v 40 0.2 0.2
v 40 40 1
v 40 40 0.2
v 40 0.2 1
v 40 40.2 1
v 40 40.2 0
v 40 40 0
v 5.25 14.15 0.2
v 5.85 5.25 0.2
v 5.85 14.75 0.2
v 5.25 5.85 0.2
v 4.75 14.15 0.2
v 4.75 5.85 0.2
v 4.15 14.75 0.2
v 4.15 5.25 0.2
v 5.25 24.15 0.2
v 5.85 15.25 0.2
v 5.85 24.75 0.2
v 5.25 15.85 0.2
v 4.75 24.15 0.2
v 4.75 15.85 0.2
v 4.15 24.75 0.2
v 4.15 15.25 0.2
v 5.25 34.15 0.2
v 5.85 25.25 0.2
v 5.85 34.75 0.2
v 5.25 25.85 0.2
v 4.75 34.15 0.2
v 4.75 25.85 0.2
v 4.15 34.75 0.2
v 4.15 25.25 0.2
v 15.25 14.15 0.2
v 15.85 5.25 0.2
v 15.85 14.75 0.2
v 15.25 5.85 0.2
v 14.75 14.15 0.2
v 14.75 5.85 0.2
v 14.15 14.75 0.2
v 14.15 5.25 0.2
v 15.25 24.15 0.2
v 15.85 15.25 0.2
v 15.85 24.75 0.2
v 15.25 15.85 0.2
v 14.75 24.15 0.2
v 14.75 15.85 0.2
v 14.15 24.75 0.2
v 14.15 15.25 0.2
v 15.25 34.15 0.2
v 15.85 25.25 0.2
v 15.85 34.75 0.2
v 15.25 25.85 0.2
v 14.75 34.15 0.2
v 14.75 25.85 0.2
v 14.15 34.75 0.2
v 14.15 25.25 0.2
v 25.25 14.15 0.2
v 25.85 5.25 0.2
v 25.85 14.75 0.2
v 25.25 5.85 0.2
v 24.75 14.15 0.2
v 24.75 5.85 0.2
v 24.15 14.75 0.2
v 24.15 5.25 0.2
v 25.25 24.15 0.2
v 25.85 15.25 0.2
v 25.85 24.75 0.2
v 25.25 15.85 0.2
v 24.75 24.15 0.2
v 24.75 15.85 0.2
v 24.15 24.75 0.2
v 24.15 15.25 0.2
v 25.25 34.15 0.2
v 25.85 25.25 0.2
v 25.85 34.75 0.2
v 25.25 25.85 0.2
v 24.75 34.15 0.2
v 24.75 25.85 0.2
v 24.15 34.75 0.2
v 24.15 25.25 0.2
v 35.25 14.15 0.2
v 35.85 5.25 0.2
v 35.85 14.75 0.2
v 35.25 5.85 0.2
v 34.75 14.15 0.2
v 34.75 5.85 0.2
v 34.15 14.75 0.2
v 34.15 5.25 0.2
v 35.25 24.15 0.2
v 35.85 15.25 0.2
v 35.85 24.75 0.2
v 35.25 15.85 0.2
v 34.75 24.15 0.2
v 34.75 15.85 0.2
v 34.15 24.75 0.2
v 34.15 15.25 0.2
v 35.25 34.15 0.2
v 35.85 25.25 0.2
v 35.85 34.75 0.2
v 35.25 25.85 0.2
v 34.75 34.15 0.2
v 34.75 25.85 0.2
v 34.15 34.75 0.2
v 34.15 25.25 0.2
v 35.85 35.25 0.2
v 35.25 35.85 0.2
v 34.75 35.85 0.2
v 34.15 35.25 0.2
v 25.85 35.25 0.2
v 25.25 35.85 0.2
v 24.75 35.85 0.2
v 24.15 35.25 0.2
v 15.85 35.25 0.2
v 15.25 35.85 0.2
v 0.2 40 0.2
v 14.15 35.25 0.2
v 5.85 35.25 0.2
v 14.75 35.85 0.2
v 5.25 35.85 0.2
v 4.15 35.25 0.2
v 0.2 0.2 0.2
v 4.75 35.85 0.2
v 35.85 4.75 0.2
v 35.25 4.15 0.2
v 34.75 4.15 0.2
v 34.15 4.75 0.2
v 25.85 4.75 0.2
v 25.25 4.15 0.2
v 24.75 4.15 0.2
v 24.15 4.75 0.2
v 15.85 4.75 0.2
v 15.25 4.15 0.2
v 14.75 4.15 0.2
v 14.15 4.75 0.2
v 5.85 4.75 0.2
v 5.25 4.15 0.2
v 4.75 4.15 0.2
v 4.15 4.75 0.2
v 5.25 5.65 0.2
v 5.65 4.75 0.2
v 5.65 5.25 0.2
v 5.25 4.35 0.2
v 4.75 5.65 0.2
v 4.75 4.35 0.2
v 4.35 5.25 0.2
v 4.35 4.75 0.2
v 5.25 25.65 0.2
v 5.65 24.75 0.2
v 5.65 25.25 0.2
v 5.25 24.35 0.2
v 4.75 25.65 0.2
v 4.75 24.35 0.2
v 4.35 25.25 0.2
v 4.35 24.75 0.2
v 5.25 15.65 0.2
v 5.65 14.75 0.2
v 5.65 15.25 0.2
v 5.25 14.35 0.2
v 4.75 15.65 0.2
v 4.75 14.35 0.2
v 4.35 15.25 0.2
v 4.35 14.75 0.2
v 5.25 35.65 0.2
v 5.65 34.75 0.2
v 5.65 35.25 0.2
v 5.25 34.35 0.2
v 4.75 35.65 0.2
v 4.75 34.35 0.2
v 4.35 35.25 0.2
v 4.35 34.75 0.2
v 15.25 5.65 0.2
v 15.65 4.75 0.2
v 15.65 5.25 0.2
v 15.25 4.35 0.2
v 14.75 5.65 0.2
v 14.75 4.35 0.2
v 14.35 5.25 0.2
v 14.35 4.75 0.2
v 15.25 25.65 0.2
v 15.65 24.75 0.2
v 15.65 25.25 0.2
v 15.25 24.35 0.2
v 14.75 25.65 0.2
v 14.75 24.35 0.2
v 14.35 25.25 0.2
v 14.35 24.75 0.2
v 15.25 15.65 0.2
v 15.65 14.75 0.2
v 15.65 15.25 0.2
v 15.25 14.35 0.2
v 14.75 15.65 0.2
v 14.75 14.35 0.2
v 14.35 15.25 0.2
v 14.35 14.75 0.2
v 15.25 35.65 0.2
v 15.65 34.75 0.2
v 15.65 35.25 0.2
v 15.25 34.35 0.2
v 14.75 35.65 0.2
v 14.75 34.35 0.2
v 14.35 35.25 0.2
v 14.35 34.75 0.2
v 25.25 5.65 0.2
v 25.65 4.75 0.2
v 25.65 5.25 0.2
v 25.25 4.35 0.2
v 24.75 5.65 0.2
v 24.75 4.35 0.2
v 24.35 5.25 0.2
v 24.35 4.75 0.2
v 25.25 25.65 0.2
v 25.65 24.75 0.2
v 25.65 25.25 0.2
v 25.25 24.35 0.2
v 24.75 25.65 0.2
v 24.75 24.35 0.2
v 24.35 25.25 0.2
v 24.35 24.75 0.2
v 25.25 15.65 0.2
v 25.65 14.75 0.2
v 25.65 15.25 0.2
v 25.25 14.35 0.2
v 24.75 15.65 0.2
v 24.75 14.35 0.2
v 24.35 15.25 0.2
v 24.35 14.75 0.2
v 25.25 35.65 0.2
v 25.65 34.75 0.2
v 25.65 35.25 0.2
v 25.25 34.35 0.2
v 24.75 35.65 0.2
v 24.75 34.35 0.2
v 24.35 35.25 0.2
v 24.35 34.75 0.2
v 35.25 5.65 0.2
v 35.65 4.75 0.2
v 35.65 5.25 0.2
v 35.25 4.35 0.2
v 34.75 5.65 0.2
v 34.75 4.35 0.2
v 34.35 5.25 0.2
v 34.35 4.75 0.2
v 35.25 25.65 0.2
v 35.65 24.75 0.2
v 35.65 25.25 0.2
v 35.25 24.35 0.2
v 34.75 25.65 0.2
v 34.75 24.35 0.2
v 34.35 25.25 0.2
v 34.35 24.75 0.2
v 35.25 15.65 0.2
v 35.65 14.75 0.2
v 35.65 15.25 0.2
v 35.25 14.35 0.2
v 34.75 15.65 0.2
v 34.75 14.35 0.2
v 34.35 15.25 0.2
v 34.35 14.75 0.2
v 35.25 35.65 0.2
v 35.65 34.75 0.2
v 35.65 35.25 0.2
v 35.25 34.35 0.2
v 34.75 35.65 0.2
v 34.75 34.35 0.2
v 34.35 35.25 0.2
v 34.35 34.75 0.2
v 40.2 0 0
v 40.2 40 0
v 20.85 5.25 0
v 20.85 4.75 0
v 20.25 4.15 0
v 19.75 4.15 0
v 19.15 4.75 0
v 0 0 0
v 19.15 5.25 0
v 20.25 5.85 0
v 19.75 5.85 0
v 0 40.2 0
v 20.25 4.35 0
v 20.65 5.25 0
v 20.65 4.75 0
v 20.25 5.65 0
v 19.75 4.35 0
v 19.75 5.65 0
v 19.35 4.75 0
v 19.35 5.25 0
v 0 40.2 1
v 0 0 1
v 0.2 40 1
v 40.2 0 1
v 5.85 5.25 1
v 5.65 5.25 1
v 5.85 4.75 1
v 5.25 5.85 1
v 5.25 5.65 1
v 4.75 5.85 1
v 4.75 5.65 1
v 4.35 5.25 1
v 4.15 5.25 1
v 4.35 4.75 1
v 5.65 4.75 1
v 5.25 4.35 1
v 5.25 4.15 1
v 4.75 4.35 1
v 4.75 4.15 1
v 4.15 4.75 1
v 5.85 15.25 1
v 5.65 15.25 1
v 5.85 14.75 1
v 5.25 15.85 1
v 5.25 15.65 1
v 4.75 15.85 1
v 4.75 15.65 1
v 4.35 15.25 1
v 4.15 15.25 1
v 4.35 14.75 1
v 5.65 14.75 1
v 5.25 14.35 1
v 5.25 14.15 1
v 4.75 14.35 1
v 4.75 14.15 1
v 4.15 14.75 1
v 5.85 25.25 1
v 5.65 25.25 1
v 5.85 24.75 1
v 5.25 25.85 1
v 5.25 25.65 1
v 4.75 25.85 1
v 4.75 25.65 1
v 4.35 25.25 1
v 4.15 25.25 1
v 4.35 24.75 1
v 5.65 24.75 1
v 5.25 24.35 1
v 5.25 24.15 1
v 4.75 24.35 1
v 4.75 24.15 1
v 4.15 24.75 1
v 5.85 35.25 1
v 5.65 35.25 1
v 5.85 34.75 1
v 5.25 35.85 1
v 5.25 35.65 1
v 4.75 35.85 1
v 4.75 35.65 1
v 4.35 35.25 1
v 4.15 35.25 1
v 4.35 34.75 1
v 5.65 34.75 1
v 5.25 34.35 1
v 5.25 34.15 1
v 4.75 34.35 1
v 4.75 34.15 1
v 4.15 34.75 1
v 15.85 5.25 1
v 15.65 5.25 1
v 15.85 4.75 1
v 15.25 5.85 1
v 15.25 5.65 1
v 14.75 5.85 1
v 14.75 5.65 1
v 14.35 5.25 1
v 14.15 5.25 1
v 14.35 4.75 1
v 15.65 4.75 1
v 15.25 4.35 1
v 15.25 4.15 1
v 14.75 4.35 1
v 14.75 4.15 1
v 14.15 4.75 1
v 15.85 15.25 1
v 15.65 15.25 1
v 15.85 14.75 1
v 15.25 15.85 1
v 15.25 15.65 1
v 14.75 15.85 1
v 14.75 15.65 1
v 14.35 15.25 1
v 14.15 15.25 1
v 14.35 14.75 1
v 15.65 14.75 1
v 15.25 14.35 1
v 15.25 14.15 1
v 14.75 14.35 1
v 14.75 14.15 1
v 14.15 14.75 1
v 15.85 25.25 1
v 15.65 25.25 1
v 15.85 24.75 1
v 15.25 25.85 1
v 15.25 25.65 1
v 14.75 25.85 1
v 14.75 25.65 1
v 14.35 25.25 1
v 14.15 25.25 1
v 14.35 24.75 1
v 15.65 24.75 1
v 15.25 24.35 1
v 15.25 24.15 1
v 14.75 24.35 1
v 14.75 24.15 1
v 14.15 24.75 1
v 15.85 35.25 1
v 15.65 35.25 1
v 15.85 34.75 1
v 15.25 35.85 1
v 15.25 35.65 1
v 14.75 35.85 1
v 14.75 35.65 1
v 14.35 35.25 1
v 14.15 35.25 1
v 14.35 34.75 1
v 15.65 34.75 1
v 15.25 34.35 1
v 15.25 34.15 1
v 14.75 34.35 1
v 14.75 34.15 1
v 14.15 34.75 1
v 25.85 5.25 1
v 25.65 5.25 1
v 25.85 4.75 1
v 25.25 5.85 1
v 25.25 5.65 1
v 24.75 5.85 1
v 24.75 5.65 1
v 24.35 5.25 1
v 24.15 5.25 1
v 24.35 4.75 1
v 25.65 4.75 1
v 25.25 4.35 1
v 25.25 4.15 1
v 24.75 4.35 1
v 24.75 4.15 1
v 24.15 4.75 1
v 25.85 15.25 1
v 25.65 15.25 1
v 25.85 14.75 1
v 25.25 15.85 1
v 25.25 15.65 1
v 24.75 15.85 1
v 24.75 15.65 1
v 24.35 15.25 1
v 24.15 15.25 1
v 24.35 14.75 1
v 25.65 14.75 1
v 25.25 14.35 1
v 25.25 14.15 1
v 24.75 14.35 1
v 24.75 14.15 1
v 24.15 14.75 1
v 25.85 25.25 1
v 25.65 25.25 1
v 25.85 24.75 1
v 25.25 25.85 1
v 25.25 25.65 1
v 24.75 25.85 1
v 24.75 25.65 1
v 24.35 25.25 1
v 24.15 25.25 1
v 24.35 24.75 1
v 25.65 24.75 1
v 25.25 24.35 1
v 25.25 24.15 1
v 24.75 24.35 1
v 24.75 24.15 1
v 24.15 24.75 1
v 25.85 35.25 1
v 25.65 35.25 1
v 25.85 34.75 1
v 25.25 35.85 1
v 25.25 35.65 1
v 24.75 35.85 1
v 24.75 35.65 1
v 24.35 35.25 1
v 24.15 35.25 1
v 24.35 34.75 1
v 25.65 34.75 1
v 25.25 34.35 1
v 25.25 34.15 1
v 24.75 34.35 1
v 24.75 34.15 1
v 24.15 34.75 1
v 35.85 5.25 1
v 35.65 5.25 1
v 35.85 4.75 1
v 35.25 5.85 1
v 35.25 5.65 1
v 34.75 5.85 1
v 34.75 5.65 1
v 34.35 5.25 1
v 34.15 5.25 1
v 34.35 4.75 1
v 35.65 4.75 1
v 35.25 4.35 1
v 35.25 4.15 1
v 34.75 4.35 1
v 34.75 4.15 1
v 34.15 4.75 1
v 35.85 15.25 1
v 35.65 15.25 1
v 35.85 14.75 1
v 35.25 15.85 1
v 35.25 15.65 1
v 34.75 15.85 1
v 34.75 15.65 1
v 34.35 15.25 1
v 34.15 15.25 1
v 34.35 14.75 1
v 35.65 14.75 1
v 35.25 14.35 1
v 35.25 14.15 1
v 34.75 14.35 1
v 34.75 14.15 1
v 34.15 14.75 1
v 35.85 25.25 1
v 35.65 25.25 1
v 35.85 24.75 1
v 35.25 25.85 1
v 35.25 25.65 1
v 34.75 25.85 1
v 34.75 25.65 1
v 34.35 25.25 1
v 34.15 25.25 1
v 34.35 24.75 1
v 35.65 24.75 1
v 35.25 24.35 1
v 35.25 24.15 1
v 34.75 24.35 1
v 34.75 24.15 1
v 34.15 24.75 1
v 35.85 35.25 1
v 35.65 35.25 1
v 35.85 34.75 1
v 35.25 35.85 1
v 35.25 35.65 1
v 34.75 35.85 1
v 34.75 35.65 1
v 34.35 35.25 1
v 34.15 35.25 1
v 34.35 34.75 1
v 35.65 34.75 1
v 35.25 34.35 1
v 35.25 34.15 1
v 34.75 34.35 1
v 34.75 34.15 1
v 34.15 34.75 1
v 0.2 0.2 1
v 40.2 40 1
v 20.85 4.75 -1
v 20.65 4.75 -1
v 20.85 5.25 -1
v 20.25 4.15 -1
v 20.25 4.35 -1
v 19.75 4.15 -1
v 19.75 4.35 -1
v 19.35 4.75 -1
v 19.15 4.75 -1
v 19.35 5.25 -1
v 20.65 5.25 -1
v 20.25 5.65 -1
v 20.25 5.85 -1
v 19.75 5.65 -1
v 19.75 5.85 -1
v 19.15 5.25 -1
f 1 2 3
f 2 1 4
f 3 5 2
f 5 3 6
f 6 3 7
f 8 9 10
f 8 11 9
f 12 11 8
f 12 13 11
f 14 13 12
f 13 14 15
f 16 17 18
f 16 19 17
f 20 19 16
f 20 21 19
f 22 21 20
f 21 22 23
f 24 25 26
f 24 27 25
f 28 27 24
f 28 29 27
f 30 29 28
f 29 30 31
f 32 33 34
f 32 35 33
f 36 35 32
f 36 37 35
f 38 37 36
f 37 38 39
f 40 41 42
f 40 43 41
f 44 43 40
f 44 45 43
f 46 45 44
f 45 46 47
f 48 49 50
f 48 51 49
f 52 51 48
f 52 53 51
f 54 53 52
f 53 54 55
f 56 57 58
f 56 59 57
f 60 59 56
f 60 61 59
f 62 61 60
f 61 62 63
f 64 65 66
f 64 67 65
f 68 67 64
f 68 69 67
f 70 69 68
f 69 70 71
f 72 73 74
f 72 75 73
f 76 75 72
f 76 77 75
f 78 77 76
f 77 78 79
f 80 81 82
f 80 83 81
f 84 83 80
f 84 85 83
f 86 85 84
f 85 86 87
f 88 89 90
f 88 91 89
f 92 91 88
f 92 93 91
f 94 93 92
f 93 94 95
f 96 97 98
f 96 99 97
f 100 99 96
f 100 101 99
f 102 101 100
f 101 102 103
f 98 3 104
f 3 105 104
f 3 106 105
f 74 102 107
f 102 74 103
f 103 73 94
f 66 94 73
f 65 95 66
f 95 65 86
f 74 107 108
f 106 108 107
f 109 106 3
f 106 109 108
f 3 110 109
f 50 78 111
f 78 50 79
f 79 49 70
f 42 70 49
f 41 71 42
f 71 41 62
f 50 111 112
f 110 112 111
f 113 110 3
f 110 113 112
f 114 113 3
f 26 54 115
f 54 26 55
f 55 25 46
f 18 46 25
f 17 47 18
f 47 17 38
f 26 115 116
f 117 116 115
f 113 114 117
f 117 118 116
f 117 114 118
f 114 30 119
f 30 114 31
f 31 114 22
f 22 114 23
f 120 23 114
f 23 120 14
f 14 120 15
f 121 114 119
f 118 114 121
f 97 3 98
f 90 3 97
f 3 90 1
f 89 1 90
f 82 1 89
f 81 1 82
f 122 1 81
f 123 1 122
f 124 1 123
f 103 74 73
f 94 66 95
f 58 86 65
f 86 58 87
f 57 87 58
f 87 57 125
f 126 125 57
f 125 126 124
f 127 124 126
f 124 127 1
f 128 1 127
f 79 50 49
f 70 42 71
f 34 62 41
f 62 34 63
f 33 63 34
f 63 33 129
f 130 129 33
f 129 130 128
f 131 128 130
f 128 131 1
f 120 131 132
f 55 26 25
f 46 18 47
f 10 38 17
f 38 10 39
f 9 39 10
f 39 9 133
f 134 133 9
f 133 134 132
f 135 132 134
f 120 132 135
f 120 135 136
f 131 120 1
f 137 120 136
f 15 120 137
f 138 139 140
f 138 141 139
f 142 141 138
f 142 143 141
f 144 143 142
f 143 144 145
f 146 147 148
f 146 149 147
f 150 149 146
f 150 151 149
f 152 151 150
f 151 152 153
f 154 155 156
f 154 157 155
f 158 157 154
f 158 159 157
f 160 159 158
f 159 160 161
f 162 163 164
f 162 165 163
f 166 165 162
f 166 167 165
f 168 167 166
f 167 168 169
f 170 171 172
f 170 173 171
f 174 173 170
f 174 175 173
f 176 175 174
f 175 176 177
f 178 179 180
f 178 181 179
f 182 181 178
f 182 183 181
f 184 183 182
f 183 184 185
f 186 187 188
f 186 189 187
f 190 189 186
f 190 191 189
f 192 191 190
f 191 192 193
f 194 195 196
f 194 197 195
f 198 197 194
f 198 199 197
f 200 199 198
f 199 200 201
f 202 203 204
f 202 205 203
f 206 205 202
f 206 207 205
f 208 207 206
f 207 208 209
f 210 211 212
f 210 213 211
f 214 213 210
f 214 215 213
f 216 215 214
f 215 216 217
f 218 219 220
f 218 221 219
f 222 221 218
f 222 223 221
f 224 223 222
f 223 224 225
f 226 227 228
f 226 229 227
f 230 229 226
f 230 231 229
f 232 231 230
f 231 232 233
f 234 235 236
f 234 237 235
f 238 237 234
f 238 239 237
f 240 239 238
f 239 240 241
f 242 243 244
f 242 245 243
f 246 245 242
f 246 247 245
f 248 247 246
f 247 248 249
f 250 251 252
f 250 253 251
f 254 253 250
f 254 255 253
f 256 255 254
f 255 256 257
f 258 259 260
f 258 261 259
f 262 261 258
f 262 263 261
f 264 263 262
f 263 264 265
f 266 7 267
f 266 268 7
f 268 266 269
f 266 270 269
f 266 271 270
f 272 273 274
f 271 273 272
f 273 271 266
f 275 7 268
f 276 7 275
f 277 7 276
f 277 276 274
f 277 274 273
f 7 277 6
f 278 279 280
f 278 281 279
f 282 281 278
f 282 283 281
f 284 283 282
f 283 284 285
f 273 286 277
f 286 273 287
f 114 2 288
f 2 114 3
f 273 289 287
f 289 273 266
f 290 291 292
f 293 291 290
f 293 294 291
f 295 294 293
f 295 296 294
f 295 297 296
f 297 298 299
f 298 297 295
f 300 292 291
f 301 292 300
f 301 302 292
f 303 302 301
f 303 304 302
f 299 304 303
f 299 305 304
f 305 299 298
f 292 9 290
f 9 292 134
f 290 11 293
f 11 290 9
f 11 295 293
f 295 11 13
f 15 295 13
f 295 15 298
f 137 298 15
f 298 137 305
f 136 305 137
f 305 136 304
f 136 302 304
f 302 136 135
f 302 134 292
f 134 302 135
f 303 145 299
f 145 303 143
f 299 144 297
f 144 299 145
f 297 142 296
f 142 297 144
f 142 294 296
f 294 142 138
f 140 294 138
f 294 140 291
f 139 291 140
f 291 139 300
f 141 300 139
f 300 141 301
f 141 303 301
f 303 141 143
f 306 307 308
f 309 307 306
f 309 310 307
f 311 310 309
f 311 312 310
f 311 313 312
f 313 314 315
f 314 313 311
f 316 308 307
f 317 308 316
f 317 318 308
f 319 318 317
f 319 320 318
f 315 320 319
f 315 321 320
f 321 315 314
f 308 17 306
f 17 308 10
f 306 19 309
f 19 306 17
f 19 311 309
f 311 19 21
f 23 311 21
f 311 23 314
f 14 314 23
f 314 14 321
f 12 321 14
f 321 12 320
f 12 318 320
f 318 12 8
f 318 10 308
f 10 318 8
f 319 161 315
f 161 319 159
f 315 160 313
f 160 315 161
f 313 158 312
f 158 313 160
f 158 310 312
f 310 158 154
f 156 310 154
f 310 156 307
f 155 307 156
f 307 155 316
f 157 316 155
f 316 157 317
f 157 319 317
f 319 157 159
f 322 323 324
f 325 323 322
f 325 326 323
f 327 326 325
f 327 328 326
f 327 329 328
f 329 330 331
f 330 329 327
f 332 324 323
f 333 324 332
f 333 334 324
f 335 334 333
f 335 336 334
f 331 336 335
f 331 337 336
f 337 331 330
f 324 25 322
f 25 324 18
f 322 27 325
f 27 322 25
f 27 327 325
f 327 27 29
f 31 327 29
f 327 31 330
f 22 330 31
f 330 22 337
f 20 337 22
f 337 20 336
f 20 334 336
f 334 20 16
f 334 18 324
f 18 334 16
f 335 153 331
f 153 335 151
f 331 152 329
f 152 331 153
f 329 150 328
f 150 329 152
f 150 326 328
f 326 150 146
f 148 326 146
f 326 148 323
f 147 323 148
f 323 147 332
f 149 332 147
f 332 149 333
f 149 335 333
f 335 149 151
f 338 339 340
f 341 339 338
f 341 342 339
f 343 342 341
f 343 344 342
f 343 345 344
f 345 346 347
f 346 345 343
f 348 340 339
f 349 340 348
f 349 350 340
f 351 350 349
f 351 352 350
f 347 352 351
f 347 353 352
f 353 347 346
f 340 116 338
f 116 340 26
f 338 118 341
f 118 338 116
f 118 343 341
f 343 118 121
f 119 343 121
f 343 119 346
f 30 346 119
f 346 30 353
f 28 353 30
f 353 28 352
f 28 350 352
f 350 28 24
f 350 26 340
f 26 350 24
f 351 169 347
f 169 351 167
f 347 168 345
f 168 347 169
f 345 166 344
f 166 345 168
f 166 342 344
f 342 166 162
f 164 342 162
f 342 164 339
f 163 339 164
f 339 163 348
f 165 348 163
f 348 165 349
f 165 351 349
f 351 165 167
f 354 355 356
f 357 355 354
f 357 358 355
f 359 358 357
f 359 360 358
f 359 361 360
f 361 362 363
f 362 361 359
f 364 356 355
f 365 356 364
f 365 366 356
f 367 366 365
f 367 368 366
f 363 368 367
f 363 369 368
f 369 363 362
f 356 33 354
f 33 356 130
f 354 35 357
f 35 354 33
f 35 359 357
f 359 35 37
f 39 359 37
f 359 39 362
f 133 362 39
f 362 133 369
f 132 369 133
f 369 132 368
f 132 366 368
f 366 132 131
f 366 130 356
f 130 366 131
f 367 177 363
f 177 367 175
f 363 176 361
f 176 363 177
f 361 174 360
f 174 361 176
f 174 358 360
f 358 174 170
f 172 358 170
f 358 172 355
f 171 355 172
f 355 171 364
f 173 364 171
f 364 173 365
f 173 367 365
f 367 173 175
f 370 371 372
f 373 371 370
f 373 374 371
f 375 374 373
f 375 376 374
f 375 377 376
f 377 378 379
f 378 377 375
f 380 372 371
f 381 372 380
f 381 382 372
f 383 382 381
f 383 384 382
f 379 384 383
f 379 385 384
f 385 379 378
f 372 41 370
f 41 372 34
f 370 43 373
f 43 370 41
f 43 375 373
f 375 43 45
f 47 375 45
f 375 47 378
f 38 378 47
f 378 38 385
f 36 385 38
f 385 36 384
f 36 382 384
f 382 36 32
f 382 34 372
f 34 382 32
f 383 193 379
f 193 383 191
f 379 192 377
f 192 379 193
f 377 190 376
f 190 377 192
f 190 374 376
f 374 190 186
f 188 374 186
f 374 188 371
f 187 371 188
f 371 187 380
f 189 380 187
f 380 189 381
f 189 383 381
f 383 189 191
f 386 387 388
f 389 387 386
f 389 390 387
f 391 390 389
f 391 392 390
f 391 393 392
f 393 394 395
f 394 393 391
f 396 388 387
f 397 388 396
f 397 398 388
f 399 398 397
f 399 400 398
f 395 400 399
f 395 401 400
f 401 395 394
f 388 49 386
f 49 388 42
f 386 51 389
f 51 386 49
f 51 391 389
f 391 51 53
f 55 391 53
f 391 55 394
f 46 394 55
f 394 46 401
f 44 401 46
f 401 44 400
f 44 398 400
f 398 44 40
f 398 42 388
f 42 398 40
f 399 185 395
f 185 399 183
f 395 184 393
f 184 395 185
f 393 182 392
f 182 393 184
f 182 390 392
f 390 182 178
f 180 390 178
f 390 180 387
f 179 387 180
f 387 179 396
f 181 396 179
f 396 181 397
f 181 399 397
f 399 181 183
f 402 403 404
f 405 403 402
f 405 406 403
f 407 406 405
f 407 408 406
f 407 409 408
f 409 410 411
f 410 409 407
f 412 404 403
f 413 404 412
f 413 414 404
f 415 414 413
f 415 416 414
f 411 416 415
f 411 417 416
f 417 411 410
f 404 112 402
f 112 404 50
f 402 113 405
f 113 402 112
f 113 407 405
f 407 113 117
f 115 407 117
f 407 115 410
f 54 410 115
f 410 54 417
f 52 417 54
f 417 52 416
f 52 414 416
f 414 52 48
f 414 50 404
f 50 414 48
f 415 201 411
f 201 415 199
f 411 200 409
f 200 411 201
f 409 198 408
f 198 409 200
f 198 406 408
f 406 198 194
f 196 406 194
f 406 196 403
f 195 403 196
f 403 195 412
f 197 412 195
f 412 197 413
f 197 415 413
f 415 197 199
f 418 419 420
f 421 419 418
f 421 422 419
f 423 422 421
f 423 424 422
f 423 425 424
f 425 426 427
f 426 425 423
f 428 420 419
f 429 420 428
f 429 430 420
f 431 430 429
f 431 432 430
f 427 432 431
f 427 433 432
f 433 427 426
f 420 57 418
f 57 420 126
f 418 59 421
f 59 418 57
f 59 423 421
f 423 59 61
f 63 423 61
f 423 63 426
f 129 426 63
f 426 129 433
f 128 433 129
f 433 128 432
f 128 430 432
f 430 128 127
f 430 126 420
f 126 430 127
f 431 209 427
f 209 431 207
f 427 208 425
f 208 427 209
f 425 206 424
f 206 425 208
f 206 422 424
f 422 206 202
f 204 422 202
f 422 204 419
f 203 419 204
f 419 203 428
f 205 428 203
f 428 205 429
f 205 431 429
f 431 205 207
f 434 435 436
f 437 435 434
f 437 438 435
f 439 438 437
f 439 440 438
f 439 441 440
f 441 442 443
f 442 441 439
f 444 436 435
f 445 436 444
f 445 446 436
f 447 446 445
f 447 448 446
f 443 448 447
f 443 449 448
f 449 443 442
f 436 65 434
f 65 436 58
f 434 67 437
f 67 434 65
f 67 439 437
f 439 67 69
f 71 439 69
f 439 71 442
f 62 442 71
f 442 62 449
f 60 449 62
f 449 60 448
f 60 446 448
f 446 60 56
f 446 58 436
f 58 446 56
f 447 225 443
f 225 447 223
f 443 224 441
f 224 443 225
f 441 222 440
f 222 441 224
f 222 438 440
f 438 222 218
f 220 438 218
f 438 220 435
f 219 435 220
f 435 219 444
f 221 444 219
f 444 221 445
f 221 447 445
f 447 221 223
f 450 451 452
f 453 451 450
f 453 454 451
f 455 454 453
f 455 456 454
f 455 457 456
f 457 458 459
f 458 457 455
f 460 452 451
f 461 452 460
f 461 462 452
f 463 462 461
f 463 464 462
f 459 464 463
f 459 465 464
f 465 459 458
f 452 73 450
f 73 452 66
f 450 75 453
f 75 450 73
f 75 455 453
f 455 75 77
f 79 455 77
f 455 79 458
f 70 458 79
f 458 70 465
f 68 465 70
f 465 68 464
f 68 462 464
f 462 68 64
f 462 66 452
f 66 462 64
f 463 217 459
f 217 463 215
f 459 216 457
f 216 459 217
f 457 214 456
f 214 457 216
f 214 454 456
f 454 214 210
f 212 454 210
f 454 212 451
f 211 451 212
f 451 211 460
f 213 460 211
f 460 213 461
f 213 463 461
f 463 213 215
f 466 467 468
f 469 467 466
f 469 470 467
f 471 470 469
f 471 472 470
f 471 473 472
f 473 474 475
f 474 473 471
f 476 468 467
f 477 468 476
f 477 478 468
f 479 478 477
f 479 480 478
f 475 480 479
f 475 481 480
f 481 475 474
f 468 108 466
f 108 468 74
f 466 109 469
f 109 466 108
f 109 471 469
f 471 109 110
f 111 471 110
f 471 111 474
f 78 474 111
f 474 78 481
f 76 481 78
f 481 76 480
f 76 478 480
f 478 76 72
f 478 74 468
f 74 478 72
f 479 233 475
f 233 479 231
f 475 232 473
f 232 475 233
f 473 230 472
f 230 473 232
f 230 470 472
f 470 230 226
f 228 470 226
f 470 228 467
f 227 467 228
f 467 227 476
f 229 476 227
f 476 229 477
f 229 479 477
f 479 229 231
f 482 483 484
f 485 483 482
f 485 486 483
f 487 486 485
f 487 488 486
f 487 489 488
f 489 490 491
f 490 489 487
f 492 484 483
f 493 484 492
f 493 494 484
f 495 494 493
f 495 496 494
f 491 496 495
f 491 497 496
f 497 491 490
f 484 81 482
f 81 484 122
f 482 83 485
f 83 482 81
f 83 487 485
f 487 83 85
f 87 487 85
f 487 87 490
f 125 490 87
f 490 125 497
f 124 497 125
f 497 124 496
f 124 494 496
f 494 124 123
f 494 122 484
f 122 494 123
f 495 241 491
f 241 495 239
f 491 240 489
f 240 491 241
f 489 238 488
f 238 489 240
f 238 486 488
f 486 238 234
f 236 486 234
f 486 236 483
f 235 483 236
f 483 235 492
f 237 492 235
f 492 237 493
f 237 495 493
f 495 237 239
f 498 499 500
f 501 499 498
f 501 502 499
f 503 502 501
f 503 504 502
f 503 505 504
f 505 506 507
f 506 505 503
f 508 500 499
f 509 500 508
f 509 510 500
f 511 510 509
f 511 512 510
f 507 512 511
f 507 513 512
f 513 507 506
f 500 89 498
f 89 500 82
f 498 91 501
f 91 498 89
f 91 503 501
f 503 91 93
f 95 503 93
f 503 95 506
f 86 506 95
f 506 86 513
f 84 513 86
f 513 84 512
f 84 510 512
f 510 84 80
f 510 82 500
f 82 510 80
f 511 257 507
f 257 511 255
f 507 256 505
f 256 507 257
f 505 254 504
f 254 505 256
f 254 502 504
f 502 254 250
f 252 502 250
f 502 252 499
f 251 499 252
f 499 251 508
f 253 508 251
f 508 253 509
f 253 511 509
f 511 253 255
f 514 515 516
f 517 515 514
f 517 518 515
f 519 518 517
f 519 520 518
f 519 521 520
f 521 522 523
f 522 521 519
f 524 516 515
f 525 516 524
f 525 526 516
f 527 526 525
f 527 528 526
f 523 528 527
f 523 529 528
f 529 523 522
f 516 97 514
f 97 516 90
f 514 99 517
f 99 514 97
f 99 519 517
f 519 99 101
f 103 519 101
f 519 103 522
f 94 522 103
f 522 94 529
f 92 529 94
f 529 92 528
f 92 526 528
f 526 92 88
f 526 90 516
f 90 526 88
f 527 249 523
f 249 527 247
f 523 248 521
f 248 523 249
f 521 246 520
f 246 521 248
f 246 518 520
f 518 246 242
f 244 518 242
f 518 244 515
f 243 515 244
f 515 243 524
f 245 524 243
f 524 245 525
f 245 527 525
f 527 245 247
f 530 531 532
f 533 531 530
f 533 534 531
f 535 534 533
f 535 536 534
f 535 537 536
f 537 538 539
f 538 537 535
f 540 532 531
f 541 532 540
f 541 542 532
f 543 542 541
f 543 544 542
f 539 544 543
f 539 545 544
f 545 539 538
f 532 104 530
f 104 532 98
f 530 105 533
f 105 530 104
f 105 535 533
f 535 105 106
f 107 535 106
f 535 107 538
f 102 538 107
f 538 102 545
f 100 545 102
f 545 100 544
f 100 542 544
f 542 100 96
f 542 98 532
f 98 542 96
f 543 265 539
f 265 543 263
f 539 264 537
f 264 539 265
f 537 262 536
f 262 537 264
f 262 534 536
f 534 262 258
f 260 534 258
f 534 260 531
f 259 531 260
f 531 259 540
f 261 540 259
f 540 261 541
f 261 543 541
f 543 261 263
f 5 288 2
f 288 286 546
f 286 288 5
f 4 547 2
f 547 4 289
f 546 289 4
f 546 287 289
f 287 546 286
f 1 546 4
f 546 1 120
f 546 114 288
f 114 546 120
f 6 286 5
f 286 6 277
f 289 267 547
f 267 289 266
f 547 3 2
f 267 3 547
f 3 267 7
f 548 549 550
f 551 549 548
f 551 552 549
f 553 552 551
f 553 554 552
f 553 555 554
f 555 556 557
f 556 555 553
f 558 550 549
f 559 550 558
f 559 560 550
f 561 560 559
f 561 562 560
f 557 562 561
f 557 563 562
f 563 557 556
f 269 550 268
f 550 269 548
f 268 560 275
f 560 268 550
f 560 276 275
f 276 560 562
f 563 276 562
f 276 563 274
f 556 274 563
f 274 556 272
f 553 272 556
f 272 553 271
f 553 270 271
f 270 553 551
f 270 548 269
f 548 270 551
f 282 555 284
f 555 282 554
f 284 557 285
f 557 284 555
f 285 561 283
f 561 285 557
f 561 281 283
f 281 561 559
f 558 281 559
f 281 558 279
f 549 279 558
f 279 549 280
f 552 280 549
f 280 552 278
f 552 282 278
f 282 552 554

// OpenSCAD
laenge = 40;
breite = 40; 
dicke = 0.2;
hoehe = 1;
difference(){
    difference(){
        cube([laenge,breite,dicke],center = false);
        translate([breite/2,5,0])
            square(0.5);
     }
     for (i=[1:4])
        for (j=[1:4])
            translate([i*10-5.5,j*10-5.5,0])
            square(1);
}
// translate([laenge/2,    breite    ,1])
    cube([laenge,dicke,hoehe],center = false);
    cube([dicke,laenge,hoehe],center = false);
translate([0,    breite    ,0])
    cube([laenge,dicke,hoehe],center = false);
translate([laenge,    0    ,0])
    cube([dicke,laenge,hoehe],center = false);
translate([breite/2,5,-1])   
   linear_extrude(height = 1, twist = 0, slices = 10) {
        difference() {
            offset(r = 0.6) {
            square(0.5, center = true);
            }
            offset(r = 0.4) {
            square(0.5, center = true);
            }
        }
    } 

for (i=[1:4])
     for (j=[1:4])
         translate([i*10-5,j*10-5,0])   
            linear_extrude(height = 1, twist = 0, slices = 10) {
                difference() {
                    offset(r = 0.6) {
                    square(0.5, center = true);
                    }
                    offset(r = 0.4) {
                    square(0.5, center = true);
                    }
        }
    } 
